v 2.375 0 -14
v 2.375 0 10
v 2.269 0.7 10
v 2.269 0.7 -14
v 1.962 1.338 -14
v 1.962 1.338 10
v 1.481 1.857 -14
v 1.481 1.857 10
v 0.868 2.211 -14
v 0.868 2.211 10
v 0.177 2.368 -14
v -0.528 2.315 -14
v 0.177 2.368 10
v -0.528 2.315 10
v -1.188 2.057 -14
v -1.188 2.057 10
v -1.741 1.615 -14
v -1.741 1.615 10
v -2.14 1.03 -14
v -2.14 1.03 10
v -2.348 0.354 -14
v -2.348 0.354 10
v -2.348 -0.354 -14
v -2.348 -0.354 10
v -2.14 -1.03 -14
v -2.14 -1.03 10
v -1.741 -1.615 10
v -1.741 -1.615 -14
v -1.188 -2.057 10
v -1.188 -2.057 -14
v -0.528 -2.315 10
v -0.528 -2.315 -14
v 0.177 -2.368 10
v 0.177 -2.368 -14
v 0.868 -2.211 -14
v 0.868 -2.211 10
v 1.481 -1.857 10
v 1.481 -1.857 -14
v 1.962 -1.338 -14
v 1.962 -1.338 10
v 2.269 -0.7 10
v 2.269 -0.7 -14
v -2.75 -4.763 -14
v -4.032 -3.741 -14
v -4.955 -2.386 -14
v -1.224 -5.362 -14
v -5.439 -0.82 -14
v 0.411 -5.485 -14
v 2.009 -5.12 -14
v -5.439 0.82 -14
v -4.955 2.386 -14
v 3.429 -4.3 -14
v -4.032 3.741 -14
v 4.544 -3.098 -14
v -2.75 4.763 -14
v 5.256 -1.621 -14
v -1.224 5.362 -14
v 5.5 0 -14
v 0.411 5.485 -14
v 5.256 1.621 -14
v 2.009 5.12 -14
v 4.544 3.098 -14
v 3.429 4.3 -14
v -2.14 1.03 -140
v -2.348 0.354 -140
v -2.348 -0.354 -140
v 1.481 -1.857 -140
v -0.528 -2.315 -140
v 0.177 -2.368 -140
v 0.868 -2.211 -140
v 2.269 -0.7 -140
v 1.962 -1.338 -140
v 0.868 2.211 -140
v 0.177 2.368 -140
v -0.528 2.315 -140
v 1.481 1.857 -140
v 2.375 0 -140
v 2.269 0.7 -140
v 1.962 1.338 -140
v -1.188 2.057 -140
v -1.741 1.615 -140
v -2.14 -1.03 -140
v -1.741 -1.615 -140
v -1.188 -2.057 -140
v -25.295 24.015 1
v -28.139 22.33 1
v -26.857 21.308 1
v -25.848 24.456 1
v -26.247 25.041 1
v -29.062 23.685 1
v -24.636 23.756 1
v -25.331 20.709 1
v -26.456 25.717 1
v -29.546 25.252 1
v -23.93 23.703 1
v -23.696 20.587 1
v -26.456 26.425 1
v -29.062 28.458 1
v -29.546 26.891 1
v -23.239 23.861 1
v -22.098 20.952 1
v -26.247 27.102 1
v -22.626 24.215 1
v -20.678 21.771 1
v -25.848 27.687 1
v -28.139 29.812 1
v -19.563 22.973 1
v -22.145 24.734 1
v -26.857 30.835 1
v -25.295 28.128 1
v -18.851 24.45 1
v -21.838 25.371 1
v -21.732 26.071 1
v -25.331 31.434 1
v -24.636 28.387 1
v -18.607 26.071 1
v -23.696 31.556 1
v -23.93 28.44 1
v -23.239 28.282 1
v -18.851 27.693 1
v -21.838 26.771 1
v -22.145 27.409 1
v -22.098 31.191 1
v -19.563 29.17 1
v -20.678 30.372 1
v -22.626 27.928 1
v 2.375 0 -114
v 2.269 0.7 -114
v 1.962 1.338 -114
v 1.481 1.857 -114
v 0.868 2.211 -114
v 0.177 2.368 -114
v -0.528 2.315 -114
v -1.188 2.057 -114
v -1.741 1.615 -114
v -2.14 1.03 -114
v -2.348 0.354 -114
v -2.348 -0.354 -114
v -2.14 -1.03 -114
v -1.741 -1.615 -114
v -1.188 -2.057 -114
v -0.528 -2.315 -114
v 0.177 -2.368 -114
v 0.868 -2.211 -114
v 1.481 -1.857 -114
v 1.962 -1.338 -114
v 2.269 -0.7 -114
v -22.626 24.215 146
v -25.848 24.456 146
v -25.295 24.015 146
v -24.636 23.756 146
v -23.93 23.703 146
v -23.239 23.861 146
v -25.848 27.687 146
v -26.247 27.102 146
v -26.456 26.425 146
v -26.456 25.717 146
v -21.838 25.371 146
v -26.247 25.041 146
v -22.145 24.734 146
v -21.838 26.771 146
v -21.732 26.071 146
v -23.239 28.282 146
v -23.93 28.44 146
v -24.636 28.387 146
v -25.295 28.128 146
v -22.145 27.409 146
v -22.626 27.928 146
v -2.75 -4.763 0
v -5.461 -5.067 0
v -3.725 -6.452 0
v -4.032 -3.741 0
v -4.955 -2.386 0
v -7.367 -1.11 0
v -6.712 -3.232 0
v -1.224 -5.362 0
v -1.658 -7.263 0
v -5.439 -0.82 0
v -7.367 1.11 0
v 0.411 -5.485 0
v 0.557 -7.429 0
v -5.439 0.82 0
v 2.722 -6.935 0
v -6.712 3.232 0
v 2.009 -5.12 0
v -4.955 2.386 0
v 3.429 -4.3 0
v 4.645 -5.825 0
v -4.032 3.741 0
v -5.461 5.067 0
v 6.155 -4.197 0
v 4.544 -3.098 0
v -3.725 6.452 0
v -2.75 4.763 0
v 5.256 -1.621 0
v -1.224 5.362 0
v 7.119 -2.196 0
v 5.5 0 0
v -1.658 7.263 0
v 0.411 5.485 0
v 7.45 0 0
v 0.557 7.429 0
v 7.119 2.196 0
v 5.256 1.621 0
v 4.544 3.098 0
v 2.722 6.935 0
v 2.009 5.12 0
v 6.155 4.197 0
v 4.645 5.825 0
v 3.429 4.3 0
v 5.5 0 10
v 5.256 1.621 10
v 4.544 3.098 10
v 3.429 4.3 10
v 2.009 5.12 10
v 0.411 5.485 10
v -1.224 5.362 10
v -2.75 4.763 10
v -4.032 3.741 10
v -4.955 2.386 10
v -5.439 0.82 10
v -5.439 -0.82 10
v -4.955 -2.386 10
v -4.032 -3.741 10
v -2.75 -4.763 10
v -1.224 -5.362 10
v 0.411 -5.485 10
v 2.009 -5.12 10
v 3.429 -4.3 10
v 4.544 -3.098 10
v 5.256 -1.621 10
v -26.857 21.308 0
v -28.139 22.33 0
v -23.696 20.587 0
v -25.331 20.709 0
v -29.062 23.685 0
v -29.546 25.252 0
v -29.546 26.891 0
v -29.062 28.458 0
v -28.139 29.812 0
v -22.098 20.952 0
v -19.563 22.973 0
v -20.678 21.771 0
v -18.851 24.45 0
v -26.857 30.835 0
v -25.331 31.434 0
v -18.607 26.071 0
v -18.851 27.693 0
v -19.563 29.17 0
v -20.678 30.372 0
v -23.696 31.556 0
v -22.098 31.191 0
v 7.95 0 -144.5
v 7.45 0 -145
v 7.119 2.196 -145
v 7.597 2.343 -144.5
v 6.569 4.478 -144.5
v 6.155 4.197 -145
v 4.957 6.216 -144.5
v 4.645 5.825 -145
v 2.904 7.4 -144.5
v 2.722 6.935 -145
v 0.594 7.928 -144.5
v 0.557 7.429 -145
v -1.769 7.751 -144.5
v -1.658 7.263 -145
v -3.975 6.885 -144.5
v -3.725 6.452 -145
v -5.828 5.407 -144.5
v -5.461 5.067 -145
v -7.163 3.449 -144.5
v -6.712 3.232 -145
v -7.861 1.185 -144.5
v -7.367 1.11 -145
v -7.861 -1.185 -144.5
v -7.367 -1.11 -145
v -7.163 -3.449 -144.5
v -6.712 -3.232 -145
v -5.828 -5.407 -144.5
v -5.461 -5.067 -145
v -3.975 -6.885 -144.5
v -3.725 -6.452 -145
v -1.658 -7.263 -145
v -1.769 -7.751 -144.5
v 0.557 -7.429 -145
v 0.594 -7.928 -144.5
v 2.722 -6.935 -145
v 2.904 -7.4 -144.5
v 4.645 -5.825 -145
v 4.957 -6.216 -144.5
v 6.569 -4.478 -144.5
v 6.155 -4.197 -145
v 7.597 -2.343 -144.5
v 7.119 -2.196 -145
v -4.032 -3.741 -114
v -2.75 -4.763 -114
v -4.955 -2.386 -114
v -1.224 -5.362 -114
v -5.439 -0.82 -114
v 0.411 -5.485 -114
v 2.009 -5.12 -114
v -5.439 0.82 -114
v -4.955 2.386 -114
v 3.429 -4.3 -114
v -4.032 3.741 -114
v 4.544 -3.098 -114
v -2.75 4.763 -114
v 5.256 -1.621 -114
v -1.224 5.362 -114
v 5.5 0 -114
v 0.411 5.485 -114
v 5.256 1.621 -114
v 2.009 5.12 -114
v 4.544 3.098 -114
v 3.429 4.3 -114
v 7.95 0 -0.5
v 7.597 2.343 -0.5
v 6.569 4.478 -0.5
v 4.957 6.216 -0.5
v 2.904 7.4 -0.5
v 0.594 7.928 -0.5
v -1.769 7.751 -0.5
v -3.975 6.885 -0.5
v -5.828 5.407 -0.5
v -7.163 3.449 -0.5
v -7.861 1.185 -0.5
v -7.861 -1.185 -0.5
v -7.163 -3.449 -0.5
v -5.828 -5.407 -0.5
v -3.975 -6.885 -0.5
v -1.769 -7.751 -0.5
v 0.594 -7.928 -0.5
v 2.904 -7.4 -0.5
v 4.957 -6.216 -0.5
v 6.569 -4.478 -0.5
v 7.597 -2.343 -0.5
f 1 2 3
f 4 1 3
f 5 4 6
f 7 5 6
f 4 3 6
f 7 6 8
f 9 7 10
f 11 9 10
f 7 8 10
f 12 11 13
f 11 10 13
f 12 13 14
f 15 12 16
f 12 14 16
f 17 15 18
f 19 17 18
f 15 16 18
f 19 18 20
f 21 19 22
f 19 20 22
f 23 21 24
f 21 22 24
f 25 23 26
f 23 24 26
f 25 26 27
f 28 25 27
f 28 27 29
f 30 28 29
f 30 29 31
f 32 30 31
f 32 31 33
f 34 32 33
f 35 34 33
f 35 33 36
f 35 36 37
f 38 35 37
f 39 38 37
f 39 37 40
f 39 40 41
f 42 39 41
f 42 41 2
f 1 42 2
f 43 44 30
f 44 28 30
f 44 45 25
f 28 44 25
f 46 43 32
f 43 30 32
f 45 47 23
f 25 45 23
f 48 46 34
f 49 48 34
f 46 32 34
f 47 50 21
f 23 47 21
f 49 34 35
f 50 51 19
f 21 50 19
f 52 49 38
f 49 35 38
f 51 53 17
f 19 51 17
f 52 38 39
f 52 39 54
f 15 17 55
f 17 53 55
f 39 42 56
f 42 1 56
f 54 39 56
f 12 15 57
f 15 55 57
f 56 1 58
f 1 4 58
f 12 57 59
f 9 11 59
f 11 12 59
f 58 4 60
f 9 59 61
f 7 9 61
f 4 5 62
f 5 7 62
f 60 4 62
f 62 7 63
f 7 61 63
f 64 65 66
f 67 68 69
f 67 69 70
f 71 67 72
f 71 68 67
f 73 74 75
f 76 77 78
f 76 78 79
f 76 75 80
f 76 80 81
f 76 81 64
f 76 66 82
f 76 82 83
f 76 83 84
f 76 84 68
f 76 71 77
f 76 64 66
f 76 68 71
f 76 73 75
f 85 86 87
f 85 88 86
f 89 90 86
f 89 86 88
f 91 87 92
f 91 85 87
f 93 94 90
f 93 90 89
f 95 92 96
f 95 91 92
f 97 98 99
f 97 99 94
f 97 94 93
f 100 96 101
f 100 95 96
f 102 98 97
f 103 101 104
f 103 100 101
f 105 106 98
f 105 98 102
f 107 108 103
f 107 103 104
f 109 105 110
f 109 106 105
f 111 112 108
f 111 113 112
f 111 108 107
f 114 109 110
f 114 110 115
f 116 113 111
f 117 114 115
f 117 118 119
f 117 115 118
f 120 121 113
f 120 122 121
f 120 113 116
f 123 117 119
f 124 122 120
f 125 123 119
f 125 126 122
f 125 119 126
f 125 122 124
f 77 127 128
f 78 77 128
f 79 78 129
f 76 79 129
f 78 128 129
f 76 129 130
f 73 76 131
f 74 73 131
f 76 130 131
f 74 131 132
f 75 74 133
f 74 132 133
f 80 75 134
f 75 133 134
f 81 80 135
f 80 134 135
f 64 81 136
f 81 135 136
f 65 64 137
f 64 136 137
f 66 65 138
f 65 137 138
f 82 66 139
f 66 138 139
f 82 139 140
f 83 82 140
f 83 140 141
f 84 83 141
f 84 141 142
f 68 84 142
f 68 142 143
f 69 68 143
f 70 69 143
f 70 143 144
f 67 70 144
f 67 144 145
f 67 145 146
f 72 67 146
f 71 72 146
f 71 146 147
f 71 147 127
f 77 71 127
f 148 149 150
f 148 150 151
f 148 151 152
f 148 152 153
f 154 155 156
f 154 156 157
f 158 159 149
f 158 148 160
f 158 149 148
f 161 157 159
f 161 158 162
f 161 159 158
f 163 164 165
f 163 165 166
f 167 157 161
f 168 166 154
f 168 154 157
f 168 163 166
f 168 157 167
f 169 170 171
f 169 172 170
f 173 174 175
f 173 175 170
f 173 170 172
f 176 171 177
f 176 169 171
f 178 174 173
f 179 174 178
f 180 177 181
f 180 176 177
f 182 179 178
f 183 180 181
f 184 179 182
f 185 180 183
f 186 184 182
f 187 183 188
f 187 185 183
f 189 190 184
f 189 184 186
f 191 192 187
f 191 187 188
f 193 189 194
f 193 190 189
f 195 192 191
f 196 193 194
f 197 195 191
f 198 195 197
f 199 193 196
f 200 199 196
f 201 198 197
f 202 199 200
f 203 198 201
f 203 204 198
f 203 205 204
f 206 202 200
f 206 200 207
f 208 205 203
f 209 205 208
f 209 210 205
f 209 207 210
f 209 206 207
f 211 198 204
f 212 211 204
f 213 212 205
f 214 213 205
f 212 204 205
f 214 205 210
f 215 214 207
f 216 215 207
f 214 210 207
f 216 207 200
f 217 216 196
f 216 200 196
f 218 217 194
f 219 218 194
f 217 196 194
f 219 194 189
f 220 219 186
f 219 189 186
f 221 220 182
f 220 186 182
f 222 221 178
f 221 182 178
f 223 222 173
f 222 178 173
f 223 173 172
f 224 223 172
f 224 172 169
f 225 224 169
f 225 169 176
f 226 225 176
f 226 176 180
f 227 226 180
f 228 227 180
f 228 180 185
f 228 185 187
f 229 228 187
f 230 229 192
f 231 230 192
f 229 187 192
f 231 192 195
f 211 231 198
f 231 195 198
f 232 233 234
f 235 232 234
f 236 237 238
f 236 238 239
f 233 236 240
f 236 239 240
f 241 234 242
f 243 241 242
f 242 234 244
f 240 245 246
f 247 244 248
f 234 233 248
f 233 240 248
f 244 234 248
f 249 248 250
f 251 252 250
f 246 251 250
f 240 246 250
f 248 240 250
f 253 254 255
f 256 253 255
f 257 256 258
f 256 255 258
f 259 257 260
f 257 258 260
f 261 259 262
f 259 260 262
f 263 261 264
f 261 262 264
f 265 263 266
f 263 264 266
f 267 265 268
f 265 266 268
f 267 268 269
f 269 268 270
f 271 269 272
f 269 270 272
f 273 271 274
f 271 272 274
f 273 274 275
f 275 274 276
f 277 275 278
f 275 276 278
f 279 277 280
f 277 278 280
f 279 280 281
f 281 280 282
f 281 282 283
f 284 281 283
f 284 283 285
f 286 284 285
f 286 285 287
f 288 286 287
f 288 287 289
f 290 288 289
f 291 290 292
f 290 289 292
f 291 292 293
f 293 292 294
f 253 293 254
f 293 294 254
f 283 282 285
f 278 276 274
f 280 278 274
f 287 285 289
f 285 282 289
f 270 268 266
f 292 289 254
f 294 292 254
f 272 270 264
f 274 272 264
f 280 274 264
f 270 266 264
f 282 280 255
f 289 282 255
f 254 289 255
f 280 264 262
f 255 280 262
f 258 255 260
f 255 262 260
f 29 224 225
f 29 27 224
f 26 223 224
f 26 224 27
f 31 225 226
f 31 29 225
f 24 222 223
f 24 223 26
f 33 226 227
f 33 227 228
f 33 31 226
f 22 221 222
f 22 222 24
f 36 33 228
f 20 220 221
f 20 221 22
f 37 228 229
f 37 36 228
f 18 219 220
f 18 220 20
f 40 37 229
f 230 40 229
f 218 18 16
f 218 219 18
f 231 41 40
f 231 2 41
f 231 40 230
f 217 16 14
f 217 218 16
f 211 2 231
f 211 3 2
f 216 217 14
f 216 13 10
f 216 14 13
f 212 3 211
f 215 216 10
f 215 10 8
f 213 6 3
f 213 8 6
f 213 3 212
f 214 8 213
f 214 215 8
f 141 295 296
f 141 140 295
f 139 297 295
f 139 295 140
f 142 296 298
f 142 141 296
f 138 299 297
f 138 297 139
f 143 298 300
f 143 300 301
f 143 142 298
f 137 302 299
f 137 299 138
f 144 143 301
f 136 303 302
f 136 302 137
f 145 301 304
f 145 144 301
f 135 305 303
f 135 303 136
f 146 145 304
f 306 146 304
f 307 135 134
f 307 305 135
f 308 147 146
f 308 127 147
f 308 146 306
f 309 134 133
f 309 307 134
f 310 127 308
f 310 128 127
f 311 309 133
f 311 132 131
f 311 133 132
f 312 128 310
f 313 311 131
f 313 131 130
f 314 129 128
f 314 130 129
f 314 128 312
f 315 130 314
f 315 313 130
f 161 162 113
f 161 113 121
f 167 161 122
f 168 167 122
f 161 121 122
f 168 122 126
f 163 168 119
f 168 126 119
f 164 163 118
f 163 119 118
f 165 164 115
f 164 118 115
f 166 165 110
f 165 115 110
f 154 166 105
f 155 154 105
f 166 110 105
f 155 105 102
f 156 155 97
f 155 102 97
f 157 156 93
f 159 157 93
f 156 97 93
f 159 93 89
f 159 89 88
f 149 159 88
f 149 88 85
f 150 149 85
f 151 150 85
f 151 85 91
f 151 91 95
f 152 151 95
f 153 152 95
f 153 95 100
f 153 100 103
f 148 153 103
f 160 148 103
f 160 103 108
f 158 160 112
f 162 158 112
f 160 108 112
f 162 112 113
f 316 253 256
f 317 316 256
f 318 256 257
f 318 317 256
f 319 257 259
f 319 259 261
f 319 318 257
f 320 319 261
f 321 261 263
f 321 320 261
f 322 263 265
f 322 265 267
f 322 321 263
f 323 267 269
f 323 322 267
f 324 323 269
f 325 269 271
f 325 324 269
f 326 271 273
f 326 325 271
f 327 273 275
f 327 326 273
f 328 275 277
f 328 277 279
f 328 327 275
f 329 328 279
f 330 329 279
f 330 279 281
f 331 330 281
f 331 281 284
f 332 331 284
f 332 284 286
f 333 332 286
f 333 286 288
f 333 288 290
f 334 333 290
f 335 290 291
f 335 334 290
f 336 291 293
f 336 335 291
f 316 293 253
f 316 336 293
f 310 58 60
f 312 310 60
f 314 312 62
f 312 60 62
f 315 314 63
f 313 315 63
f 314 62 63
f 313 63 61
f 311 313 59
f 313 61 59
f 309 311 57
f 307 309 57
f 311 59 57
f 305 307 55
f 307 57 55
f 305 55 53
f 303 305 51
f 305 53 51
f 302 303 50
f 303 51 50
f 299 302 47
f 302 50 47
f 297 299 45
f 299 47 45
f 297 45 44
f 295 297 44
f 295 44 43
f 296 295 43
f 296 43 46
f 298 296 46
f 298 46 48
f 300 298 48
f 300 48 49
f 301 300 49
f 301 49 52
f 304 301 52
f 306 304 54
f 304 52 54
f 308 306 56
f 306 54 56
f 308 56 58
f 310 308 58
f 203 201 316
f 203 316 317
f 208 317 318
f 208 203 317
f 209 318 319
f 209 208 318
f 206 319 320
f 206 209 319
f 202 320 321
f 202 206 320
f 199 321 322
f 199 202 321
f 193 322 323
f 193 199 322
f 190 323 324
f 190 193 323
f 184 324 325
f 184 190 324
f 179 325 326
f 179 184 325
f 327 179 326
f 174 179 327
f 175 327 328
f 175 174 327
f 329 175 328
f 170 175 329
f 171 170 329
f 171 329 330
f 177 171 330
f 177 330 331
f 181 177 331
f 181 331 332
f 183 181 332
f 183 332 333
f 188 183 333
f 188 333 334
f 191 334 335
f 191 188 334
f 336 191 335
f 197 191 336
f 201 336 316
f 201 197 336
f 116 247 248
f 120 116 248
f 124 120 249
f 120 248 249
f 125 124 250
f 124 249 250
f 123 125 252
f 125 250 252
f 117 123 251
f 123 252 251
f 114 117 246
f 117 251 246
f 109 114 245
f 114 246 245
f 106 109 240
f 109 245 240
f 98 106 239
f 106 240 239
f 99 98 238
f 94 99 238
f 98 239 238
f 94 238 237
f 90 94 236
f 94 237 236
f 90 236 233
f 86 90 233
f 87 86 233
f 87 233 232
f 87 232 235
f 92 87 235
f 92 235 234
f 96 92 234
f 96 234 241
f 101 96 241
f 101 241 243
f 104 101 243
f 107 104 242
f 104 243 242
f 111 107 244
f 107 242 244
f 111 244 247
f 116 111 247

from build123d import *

# Parameters (mm, degrees)
F0_R        = 7.95
F1_DEPTH    = 145
F2_R        = 5.5
F3_DEPTH    = 10
F4_SIZE     = 0.5
F5_R        = 2.375
F6_DEPTH    = 150
F7_START    = -24
F3_FACE_R   = 5.5
F3_FACE_R_2 = 2.375
F7_DEPTH    = 100
F8_R        = 5.5
F9_DEPTH    = 1
F10_R       = 2.375
F11_DEPTH   = 145


with BuildPart() as f1:
    # F0 (on Top) → F1 (new body)
    with BuildSketch(Plane.XY):
        Circle(F0_R)
    extrude(amount=-F1_DEPTH)

    # F2 (on face) → F3 (join)
    with BuildSketch(Plane.XY):
        Circle(F2_R)
    extrude(amount=F3_DEPTH)

    # F4
    f4_edges = [f1.edges().sort_by_distance(p)[0] for p in [
        (-7.95, 0, 0),
        (-7.95, 0, -145),
    ]]
    chamfer(f4_edges, length=F4_SIZE)

    # F5 (on face) → F6 (cut)
    with BuildSketch(Plane.XY.offset(10)):
        Circle(F5_R)
    extrude(amount=-F6_DEPTH, mode=Mode.SUBTRACT)

    # F3_face (on face) → F7 (cut)
    with BuildSketch(Plane.XY.offset(10).offset(F7_START)):
        Circle(F3_FACE_R)
        Circle(F3_FACE_R_2, mode=Mode.SUBTRACT)
    extrude(amount=-F7_DEPTH, mode=Mode.SUBTRACT)


with BuildPart() as f9:
    # F8 (on Top) → F9 (new body)
    with BuildSketch(Plane.XY):
        with Locations((-24.1071432829, 26.0714311153)):
            Circle(F8_R)
    extrude(amount=F9_DEPTH)

    # F10 (on face) → F11 (join)
    with BuildSketch(Plane.XY.offset(1)):
        with Locations((-24.1071432829, 26.0714311153)):
            Circle(F10_R)
    extrude(amount=F11_DEPTH)


solid = Compound([f1.part, f9.part])
